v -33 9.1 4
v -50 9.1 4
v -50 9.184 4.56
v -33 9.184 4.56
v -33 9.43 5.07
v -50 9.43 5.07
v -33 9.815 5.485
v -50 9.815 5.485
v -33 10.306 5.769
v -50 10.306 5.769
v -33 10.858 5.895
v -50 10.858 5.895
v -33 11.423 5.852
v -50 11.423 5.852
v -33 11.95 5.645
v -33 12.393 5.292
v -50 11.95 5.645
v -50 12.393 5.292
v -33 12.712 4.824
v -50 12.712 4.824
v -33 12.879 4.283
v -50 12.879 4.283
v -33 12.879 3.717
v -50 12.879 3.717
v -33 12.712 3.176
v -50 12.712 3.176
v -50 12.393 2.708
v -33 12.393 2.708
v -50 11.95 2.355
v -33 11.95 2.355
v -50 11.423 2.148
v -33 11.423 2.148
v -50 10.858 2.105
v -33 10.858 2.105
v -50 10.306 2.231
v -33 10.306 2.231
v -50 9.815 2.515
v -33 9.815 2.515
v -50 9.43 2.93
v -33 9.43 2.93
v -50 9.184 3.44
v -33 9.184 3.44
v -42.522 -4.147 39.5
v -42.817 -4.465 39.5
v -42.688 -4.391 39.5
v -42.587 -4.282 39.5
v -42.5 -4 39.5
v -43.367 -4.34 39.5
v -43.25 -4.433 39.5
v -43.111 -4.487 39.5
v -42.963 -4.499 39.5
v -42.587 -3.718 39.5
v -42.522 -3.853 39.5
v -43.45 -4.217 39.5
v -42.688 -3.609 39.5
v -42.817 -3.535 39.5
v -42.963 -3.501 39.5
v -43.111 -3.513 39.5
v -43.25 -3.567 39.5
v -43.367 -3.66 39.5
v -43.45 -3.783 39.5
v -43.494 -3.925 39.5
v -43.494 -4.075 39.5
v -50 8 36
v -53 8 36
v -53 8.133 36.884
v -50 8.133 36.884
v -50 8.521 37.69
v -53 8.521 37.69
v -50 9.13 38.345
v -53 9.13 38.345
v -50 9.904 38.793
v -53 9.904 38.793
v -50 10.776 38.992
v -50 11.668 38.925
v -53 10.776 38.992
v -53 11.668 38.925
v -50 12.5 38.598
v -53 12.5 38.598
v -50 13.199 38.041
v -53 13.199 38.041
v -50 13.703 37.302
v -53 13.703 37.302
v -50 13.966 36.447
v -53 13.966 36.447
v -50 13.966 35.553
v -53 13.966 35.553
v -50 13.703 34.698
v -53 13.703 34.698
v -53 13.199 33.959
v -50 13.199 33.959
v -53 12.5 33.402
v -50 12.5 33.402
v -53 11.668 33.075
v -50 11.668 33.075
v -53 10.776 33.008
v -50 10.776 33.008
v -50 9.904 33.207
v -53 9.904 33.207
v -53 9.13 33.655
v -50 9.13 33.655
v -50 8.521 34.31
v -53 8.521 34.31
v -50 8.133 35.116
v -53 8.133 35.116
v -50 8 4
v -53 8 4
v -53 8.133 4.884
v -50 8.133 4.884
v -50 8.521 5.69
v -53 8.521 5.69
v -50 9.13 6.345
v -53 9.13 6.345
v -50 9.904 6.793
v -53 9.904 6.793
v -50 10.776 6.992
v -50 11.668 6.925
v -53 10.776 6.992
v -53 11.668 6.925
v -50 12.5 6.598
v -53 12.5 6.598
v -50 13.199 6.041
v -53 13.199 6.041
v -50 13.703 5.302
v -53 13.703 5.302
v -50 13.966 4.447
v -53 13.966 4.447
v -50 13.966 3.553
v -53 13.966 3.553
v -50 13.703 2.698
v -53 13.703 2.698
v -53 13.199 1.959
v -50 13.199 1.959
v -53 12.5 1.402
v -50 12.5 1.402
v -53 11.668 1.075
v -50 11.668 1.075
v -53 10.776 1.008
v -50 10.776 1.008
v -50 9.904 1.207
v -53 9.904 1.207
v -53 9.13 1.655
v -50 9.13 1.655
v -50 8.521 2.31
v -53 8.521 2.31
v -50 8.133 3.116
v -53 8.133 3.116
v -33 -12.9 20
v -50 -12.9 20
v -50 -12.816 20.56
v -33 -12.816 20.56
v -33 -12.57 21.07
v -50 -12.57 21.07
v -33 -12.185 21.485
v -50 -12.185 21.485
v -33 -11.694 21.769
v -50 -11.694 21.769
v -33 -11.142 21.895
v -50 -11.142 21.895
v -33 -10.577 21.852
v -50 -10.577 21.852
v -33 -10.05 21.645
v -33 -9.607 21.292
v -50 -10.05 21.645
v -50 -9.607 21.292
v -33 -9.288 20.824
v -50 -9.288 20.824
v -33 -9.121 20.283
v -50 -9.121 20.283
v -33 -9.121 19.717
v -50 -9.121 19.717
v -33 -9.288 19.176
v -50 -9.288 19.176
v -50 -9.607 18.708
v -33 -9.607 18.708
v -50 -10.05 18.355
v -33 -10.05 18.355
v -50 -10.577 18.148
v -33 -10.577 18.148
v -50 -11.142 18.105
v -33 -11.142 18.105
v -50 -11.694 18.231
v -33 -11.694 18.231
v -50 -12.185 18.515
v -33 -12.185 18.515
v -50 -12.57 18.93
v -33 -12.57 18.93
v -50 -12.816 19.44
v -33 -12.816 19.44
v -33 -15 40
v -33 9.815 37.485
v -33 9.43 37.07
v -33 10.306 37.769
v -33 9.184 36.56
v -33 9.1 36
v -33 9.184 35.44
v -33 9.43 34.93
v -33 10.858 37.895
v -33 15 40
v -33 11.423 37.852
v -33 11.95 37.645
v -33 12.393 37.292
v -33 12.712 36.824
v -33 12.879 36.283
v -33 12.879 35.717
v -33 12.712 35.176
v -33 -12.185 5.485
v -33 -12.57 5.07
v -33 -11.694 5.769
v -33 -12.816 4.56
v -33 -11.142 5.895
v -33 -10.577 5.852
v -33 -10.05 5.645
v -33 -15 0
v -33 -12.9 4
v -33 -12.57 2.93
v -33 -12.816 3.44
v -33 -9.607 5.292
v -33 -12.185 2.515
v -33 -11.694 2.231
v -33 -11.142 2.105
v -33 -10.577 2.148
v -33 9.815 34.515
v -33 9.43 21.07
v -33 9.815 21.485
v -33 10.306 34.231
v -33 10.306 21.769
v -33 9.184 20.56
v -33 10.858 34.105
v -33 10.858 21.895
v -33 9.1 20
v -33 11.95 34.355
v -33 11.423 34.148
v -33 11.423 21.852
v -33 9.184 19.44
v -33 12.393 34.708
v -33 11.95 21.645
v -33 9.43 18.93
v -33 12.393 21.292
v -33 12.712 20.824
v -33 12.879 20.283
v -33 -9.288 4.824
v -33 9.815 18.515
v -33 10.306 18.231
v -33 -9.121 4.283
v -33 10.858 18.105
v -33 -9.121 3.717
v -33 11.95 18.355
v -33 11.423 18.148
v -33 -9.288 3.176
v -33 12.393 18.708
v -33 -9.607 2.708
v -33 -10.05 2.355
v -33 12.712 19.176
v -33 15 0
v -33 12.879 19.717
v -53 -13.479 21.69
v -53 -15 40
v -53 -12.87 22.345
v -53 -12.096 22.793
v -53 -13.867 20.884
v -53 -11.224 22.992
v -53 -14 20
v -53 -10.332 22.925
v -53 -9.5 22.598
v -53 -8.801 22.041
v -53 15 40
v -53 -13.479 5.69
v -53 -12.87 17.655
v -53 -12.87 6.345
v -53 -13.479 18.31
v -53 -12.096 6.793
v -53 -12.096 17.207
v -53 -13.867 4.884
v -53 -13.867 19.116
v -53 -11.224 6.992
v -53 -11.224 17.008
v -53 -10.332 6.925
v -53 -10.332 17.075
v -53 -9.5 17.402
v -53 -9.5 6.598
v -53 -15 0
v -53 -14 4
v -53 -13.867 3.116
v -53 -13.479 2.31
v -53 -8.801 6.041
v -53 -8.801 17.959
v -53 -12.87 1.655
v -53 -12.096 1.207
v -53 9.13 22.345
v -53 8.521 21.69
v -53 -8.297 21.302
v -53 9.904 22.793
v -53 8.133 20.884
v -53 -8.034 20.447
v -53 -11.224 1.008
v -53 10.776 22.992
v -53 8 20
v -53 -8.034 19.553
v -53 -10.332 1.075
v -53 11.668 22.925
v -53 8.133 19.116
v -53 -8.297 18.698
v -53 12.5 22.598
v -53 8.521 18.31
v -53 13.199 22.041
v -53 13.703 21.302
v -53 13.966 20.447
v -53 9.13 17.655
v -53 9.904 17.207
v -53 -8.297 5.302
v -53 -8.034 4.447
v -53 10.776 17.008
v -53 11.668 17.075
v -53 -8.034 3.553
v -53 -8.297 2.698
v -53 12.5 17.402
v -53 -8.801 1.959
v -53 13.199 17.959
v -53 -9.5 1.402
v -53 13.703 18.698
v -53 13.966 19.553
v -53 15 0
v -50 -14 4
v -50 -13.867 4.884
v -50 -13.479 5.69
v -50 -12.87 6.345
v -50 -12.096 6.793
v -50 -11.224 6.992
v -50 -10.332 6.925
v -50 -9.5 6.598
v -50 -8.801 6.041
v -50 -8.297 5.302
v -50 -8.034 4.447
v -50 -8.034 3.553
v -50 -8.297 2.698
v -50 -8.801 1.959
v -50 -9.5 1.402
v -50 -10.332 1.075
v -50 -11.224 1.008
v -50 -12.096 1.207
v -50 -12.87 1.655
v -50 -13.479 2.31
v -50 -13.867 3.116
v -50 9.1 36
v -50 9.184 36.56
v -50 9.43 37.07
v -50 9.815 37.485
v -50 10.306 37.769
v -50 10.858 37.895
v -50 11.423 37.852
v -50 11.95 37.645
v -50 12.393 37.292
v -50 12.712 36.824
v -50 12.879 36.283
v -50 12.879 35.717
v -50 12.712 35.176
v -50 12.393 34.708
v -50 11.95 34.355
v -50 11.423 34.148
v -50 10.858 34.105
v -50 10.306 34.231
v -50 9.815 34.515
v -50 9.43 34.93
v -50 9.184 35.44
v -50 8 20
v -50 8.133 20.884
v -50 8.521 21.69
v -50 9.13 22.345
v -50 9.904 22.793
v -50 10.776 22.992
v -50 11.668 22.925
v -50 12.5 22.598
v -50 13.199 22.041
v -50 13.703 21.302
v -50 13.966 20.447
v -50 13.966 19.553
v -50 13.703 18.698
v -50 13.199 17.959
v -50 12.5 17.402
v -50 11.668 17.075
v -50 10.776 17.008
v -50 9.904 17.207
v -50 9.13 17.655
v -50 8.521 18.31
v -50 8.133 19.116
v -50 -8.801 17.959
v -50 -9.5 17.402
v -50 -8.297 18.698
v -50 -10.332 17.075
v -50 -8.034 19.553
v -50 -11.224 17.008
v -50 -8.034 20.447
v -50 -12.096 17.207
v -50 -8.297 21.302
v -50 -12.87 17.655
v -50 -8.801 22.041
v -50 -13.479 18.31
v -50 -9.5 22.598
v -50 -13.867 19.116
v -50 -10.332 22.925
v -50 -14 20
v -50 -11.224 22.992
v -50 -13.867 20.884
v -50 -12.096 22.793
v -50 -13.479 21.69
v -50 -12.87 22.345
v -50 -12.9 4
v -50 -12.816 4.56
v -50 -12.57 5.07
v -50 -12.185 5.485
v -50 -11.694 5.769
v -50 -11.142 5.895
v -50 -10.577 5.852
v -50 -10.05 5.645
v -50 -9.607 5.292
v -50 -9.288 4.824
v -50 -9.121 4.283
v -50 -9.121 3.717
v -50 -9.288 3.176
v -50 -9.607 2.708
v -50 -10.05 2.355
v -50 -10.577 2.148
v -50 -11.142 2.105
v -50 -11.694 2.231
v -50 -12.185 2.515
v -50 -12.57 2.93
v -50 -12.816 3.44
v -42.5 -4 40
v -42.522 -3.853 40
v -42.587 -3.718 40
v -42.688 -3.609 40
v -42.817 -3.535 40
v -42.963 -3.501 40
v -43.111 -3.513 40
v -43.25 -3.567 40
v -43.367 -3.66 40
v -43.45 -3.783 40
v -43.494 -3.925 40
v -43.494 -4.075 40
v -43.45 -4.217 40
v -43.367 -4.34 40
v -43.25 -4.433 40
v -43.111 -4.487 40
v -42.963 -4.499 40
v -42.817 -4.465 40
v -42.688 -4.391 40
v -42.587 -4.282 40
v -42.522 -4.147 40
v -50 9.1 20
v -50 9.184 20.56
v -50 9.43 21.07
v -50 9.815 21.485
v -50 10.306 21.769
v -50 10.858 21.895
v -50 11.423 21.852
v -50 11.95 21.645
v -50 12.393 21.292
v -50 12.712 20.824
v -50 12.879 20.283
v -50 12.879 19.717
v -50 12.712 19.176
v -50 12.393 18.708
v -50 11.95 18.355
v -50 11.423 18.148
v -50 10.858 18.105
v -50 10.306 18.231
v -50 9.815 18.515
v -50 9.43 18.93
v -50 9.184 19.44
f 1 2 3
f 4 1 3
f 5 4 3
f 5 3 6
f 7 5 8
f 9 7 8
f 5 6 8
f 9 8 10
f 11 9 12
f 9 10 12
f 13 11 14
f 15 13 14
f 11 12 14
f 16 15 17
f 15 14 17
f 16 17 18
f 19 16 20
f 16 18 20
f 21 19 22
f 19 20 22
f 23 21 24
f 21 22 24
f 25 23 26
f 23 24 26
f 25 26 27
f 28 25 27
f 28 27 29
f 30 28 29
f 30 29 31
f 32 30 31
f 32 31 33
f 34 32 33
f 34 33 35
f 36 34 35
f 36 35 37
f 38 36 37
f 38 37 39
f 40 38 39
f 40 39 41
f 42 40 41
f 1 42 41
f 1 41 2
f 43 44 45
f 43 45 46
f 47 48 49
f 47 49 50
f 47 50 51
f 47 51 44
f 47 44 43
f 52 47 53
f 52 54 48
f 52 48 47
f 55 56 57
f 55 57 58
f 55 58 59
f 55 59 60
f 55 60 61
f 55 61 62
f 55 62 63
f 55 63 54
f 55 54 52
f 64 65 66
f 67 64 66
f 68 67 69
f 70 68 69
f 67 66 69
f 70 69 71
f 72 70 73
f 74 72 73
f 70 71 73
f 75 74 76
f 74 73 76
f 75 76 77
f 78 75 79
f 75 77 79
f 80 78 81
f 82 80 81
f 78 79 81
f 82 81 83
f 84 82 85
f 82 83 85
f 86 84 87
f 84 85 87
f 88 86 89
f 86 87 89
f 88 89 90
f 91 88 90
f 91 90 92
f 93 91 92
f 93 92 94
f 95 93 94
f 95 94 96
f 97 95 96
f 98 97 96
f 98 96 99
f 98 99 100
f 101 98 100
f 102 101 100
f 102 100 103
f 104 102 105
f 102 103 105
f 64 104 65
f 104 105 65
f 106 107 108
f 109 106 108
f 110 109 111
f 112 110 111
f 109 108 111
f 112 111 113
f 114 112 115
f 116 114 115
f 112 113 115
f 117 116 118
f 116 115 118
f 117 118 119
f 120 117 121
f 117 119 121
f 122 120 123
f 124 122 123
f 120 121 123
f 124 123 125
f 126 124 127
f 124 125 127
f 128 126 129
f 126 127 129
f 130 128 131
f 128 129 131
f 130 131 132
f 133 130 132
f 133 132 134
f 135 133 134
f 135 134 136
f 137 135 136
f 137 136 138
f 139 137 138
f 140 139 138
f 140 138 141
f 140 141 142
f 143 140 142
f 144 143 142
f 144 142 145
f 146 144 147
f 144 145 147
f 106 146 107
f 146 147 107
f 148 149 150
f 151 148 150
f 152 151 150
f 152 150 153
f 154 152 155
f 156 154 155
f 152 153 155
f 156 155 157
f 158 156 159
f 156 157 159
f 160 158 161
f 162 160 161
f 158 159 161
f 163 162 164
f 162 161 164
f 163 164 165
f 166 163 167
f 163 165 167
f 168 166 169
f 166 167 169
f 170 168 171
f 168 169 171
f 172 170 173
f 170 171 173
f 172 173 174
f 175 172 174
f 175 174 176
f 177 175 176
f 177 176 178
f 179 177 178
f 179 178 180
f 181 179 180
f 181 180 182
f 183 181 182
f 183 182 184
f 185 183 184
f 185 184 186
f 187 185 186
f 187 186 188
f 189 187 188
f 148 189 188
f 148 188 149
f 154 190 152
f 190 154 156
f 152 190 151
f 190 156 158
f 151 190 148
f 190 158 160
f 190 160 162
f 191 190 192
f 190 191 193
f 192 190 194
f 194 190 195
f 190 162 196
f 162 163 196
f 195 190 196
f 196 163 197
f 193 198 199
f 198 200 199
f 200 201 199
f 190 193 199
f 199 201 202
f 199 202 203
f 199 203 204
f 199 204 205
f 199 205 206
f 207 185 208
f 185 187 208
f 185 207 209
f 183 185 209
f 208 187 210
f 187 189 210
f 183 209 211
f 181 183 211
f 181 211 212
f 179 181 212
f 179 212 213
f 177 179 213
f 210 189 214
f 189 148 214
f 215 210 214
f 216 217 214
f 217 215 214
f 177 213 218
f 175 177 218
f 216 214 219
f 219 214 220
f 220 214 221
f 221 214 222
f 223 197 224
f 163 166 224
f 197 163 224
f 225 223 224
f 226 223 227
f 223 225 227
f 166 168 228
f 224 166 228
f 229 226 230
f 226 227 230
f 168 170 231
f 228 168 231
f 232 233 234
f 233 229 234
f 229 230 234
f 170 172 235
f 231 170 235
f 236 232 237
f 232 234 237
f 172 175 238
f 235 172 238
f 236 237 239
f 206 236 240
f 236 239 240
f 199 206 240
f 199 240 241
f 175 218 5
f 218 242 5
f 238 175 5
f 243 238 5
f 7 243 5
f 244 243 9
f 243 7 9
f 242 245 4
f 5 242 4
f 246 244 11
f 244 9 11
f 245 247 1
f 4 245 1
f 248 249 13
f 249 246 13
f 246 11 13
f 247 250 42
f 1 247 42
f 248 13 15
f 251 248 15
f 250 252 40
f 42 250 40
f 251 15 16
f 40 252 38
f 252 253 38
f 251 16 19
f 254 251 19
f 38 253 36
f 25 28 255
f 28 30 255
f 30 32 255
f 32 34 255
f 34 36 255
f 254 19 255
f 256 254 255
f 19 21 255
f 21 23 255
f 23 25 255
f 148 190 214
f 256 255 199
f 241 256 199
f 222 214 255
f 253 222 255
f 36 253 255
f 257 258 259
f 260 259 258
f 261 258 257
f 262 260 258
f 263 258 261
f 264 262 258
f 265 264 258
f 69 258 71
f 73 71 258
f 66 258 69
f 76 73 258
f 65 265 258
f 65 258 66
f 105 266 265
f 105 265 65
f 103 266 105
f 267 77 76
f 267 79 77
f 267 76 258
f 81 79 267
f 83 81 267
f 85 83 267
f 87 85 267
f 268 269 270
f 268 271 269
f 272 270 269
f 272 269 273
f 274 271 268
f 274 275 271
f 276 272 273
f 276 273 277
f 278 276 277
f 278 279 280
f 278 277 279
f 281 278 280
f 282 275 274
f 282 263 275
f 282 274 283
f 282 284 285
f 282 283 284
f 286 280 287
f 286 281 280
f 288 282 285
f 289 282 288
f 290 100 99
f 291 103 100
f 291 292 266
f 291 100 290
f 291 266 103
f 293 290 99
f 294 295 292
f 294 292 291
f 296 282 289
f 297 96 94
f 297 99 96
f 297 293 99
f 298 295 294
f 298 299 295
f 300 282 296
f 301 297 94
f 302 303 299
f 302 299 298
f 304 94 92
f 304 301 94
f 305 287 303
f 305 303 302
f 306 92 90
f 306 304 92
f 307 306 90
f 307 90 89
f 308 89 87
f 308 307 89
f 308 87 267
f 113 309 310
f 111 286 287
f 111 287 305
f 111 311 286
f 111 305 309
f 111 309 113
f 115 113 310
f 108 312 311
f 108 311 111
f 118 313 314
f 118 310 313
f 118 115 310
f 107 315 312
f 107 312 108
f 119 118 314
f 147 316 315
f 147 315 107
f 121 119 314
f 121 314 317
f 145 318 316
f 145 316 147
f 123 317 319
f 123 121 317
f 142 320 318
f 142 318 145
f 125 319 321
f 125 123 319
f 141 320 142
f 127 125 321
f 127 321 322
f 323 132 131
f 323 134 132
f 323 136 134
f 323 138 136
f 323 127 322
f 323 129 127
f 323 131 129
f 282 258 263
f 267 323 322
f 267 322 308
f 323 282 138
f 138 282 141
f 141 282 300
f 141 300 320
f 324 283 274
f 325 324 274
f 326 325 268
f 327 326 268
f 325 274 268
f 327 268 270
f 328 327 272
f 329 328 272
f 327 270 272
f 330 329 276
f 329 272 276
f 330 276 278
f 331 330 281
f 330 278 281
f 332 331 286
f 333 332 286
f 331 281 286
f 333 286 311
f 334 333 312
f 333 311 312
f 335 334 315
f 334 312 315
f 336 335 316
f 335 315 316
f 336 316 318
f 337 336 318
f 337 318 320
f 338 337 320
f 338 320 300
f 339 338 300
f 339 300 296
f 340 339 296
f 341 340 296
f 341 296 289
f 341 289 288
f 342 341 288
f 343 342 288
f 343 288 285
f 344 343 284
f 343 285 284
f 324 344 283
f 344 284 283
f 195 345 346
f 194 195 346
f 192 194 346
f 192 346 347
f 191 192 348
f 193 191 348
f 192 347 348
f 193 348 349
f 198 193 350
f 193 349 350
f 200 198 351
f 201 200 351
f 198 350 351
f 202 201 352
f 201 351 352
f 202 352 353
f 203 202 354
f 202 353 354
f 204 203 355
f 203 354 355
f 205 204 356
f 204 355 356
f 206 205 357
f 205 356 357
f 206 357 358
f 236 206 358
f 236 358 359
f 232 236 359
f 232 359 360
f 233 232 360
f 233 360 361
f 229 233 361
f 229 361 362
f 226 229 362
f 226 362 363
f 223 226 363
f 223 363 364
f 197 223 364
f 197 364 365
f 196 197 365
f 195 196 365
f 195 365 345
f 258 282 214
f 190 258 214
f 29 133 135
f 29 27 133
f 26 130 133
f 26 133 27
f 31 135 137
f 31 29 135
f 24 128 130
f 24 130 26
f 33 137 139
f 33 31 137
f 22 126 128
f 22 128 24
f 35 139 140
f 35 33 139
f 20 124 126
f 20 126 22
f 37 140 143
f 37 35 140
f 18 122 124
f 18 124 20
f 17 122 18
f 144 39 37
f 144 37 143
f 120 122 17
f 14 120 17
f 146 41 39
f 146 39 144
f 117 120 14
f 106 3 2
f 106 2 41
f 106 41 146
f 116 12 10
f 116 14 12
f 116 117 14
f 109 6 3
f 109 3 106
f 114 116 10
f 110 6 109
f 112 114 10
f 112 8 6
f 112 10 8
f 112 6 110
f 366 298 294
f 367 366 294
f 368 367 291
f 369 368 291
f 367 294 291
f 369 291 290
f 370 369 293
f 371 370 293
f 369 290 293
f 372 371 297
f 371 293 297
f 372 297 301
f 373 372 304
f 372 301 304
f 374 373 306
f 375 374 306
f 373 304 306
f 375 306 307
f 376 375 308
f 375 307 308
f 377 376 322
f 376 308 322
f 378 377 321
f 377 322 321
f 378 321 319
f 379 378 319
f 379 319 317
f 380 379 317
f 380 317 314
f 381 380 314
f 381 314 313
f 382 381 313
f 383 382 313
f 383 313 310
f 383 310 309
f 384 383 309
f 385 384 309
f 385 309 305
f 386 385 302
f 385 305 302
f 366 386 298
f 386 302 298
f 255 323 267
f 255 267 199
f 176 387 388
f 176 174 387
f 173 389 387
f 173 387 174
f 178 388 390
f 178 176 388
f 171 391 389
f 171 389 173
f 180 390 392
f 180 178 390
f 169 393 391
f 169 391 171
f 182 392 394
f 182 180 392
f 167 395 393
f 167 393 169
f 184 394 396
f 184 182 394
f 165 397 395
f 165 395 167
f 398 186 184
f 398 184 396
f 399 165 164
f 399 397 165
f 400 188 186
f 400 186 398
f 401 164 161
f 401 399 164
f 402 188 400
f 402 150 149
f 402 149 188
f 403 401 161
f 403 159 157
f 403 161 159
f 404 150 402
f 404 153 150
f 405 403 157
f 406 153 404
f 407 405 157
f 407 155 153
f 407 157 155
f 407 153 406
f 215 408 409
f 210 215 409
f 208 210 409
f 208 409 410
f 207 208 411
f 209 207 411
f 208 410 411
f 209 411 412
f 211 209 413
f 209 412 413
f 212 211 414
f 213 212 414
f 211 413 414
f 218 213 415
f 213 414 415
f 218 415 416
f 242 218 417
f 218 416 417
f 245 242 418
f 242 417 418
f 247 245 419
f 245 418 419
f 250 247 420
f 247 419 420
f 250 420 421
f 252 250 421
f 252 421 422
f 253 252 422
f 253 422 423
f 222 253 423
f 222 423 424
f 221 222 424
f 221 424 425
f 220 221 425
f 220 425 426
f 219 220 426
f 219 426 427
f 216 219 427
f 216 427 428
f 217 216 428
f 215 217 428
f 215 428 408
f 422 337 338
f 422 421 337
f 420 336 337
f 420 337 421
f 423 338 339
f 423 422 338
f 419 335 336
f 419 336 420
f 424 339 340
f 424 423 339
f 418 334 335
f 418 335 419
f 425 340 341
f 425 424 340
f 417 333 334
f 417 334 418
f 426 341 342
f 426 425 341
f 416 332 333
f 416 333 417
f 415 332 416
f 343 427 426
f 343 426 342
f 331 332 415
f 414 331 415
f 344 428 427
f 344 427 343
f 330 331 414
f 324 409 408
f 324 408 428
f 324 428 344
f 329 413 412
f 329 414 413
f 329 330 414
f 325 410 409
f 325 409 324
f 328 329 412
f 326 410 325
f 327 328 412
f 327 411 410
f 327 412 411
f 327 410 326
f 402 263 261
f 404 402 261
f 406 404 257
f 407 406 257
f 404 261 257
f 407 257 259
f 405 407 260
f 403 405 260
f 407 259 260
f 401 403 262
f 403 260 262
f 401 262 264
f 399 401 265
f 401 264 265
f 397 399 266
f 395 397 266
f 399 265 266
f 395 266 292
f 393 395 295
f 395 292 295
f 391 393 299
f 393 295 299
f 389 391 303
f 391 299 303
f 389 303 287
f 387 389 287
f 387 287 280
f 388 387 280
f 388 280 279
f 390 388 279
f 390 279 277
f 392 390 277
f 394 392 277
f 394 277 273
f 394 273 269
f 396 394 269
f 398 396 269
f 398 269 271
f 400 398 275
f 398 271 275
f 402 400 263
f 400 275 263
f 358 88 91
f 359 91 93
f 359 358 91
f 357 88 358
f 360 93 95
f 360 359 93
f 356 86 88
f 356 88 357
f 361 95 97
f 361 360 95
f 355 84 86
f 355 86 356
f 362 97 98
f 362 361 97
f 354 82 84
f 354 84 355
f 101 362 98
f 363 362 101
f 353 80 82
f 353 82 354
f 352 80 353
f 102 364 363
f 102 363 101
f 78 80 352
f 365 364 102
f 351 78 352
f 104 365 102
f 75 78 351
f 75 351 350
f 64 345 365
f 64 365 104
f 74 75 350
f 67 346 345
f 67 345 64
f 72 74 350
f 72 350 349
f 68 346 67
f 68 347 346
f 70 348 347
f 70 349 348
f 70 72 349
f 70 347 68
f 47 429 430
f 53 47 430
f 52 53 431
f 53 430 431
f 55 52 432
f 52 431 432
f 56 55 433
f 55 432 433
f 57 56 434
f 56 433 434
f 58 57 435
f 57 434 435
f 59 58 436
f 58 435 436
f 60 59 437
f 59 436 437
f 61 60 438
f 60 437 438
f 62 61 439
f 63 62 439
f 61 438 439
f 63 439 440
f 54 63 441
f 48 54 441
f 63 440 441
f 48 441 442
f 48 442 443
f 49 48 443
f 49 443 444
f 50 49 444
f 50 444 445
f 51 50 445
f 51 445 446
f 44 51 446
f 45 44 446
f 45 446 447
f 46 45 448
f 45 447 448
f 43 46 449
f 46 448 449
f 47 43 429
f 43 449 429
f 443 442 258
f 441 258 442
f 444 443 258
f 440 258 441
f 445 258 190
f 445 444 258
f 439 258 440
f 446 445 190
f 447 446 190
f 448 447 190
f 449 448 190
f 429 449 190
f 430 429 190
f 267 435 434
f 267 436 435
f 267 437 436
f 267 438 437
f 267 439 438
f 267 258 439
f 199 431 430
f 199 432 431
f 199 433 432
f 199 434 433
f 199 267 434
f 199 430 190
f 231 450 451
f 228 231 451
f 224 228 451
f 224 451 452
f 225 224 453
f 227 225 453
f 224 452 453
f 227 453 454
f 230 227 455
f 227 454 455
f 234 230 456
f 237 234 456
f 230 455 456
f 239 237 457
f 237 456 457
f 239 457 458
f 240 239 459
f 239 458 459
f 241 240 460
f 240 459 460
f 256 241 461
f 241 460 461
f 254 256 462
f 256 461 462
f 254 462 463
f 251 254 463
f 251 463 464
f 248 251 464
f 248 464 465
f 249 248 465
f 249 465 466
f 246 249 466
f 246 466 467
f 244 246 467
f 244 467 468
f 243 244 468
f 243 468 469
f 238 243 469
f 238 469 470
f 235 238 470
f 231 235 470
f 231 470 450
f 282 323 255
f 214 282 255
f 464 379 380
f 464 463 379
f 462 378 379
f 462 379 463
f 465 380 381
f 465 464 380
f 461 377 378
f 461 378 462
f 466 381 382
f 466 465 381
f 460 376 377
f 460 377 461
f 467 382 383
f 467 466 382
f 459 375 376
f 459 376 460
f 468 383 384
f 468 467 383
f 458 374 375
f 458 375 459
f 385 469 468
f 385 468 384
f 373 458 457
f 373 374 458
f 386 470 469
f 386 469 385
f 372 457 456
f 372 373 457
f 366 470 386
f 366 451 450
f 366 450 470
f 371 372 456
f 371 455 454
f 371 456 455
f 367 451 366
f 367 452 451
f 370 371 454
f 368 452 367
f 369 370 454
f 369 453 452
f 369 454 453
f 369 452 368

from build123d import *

# Parameters (mm, degrees)
SKETCH015_W     = 20
SKETCH015_H     = 30
PAD006_DEPTH    = 40
SKETCH016_R     = 1.9
POCKET009_DEPTH = 20.001
SKETCH017_R     = 3
POCKET010_DEPTH = 3
SKETCH018_R     = 0.5
POCKET011_DEPTH = 0.5


with BuildPart() as part:
    # Sketch015 → Pad006 (new body)
    with BuildSketch(Plane.XY):
        with Locations((-43, 0)):
            Rectangle(SKETCH015_W, SKETCH015_H)
    extrude(amount=PAD006_DEPTH)

    # Sketch016 (on Face4 of Pad006) → Pocket009 (cut, through all)
    with BuildSketch(Plane(origin=(-53, 0, 0), x_dir=(0, -1, 0), z_dir=(-1, 0, 0))):
        with Locations((-11, 36)):
            Circle(SKETCH016_R)
        with Locations((11, 20)):
            Circle(SKETCH016_R)
        with Locations((-11, 20)):
            Circle(SKETCH016_R)
        with Locations((-11, 4)):
            Circle(SKETCH016_R)
        with Locations((11, 4)):
            Circle(SKETCH016_R)
    extrude(amount=-POCKET009_DEPTH, mode=Mode.SUBTRACT)

    # Sketch017 (on Face2 of Pocket009) → Pocket010 (cut)
    with BuildSketch(Plane(origin=(-53, 0, 0), x_dir=(0, -1, 0), z_dir=(-1, 0, 0))):
        with Locations((-11, 36)):
            Circle(SKETCH017_R)
        with Locations((-11, 20)):
            Circle(SKETCH017_R)
        with Locations((-11, 4)):
            Circle(SKETCH017_R)
        with Locations((11, 4)):
            Circle(SKETCH017_R)
        with Locations((11, 20)):
            Circle(SKETCH017_R)
    extrude(amount=-POCKET010_DEPTH, mode=Mode.SUBTRACT)

    # Sketch018 (on Face5 of Pocket010) → Pocket011 (cut)
    with BuildSketch(Plane.XY.offset(40)):
        with Locations((-43, -4)):
            Circle(SKETCH018_R)
    extrude(amount=-POCKET011_DEPTH, mode=Mode.SUBTRACT)


solid = part.part
